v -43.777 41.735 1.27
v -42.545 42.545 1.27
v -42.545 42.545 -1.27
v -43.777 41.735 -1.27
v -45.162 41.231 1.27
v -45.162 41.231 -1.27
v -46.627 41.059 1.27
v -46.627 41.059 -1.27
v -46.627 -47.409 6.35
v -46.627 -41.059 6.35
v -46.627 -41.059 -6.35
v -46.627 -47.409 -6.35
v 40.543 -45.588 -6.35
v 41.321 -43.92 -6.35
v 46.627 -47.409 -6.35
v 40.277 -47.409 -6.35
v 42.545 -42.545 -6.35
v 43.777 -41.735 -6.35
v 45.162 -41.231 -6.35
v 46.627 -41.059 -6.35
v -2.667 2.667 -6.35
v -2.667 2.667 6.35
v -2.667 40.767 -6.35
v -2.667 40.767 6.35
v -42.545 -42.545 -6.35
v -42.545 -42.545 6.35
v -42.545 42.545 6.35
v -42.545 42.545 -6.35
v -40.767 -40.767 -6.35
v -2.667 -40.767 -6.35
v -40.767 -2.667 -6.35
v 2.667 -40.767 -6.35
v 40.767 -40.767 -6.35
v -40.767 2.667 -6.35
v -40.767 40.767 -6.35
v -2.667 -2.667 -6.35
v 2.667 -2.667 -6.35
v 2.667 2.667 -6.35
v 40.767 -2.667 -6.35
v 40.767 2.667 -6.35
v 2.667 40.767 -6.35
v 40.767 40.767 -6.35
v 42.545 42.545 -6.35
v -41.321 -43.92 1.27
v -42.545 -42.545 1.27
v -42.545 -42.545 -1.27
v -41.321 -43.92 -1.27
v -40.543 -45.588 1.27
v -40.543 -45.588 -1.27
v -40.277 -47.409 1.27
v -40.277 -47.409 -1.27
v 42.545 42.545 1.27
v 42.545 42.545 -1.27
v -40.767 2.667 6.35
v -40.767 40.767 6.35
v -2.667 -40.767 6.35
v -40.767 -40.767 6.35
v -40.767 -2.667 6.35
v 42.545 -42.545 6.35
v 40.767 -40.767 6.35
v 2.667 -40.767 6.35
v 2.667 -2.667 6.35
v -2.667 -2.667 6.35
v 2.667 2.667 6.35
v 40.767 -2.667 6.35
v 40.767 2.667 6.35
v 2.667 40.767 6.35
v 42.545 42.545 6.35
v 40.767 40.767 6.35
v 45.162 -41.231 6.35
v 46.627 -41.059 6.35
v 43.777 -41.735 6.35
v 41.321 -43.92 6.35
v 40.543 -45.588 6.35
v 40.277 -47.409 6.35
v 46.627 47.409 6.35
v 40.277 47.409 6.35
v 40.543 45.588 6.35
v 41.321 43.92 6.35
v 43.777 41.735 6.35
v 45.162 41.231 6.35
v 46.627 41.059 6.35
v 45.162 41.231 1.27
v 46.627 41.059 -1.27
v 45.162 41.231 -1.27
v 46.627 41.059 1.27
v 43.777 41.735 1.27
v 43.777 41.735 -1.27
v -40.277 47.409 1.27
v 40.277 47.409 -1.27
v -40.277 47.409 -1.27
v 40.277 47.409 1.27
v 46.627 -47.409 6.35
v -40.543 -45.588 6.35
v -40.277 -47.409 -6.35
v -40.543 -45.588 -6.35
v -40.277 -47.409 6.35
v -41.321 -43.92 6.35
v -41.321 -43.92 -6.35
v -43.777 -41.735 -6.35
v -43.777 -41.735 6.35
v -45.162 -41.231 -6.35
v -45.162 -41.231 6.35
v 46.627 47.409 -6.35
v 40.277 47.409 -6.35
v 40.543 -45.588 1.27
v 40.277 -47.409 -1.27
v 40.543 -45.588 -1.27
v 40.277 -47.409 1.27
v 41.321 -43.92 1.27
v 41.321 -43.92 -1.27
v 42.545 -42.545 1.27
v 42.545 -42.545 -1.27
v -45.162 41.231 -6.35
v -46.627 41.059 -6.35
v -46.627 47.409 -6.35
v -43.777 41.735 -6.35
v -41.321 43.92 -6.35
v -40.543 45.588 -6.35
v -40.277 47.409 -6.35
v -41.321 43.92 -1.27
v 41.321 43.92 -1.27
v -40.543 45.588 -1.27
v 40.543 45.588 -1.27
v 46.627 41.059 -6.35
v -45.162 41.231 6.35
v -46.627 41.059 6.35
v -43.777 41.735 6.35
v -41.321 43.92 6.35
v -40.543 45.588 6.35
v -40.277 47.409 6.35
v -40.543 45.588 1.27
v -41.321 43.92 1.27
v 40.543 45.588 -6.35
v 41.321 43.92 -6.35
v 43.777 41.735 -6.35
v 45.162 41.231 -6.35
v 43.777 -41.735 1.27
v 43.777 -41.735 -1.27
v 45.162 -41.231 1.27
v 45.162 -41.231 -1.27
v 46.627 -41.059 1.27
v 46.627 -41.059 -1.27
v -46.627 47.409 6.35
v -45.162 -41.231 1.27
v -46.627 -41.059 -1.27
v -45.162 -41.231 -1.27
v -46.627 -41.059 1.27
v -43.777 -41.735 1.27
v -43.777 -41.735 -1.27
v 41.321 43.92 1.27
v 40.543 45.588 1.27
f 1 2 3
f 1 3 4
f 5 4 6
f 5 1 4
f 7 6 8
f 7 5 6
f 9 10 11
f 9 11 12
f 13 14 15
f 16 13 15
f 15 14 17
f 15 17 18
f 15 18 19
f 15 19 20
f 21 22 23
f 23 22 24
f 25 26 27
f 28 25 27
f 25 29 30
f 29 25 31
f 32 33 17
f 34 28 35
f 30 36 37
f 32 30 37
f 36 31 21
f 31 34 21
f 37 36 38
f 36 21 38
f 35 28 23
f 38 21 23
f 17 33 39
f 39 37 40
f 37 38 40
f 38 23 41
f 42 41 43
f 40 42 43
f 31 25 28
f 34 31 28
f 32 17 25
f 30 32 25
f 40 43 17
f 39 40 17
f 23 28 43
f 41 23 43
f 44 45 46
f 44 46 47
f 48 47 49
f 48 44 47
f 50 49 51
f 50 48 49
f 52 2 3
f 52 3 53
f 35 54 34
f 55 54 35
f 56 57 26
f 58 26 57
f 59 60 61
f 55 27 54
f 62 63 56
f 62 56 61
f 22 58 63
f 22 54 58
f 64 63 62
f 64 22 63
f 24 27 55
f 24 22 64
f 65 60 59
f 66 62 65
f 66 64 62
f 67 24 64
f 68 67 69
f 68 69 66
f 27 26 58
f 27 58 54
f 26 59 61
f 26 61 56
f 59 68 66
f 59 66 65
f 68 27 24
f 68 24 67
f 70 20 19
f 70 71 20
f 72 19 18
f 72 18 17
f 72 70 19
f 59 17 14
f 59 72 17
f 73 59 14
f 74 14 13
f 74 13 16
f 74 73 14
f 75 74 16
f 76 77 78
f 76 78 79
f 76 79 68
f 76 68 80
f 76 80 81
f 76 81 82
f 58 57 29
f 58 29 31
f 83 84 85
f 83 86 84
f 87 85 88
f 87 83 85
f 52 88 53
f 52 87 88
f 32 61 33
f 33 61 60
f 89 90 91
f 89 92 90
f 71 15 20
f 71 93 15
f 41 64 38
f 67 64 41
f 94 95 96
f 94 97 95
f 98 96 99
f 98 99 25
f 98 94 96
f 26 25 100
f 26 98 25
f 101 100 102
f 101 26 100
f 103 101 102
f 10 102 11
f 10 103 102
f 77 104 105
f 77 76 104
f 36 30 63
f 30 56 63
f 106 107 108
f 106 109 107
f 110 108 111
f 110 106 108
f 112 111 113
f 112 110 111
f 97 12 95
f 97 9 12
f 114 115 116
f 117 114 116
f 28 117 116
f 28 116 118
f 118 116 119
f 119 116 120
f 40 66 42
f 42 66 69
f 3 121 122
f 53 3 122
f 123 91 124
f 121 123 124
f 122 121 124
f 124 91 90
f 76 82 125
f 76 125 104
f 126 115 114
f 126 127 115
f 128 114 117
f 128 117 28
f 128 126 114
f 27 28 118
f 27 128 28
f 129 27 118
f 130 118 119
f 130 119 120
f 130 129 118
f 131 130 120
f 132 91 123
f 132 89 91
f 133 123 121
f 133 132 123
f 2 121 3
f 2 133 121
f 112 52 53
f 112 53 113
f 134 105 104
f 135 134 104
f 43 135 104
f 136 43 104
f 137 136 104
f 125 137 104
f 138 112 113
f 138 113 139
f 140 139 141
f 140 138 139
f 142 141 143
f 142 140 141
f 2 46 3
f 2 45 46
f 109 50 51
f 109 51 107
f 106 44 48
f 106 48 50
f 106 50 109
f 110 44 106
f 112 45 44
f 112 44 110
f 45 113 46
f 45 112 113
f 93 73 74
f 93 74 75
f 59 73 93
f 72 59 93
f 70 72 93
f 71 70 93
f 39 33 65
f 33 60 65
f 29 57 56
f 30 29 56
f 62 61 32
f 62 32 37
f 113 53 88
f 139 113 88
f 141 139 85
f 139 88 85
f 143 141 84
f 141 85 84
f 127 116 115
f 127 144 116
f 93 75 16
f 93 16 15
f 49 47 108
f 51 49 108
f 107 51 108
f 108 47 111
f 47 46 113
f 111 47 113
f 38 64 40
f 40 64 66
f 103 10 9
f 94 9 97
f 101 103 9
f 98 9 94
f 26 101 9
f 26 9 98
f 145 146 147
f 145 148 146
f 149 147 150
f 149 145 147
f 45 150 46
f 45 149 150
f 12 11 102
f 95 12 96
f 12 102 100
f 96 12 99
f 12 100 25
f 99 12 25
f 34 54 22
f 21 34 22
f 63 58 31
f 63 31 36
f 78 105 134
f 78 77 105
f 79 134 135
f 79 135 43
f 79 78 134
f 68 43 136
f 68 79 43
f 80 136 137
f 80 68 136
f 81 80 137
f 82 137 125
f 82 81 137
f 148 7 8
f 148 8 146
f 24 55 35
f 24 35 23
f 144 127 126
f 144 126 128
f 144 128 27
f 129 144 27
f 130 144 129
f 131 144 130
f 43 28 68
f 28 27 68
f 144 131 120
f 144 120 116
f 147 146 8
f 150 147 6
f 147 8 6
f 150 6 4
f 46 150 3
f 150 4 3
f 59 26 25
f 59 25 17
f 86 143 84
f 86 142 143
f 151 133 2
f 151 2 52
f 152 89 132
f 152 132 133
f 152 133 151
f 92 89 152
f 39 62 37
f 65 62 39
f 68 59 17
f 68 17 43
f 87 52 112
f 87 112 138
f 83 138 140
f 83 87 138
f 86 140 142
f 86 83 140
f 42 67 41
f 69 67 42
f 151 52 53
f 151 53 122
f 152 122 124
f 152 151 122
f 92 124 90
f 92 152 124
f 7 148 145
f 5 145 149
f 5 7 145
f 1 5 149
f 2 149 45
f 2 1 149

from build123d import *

# Parameters (mm, degrees)
F1_DEPTH = 6.35
F0_W     = 85.09
F0_H     = 85.09
F0_W_2   = 38.1
F0_H_2   = 38.1
F2_DEPTH = 6.35
F3_DEPTH = 1.27


with BuildPart() as f1:
    # F0 (on Top) → F1 (new body, symmetric)
    with BuildSketch(Plane.XY):
        with BuildLine():
            ThreePointArc((40.2767013215, 47.4093822138), (40.8716468738, 44.7257562518), (42.545, 42.545))
            ThreePointArc((42.545, 42.545), (44.4548734114, 41.4423340718), (46.6267013215, 41.0593822138))
            Line((46.6267013215, 41.0593822138), (46.6267013215, 47.4093822138))
            Line((46.6267013215, 47.4093822138), (40.2767013215, 47.4093822138))
        make_face()
    extrude(amount=F1_DEPTH, both=True)


with BuildPart() as f1b:
    # F0 (on Top) → F1, piece 2 (new body, symmetric)
    with BuildSketch(Plane.XY):
        with BuildLine():
            ThreePointArc((46.6267013215, -41.0593822138), (44.4548734114, -41.4423340718), (42.545, -42.545))
            ThreePointArc((42.545, -42.545), (40.8716468738, -44.7257562518), (40.2767013215, -47.4093822138))
            Line((40.2767013215, -47.4093822138), (46.6267013215, -47.4093822138))
            Line((46.6267013215, -47.4093822138), (46.6267013215, -41.0593822138))
        make_face()
    extrude(amount=F1_DEPTH, both=True)


with BuildPart() as f1c:
    # F0 (on Top) → F1, piece 3 (new body, symmetric)
    with BuildSketch(Plane.XY):
        with BuildLine():
            ThreePointArc((-46.6267013215, 41.0593822138), (-44.4548734114, 41.4423340718), (-42.545, 42.545))
            ThreePointArc((-42.545, 42.545), (-40.8716468738, 44.7257562518), (-40.2767013215, 47.4093822138))
            Line((-40.2767013215, 47.4093822138), (-46.6267013215, 47.4093822138))
            Line((-46.6267013215, 47.4093822138), (-46.6267013215, 41.0593822138))
        make_face()
    extrude(amount=F1_DEPTH, both=True)


with BuildPart() as f1d:
    # F0 (on Top) → F1, piece 4 (new body, symmetric)
    with BuildSketch(Plane.XY):
        with BuildLine():
            ThreePointArc((-40.2767013215, -47.4093822138), (-40.8716468738, -44.7257562518), (-42.545, -42.545))
            ThreePointArc((-42.545, -42.545), (-44.4548734114, -41.4423340718), (-46.6267013215, -41.0593822138))
            Line((-46.6267013215, -41.0593822138), (-46.6267013215, -47.4093822138))
            Line((-46.6267013215, -47.4093822138), (-40.2767013215, -47.4093822138))
        make_face()
    extrude(amount=F1_DEPTH, both=True)


with BuildPart() as f2:
    # F0 (on Top) → F2 (new body, symmetric)
    with BuildSketch(Plane.XY):
        Rectangle(F0_W, F0_H)
        with Locations((-21.717, -21.717)):
            Rectangle(F0_W_2, F0_H_2, mode=Mode.SUBTRACT)
        with Locations((21.717, -21.717)):
            Rectangle(F0_W_2, F0_H_2, mode=Mode.SUBTRACT)
        with Locations((-21.717, 21.717)):
            Rectangle(F0_W_2, F0_H_2, mode=Mode.SUBTRACT)
        with Locations((21.717, 21.717)):
            Rectangle(F0_W_2, F0_H_2, mode=Mode.SUBTRACT)
    extrude(amount=F2_DEPTH, both=True)


with BuildPart() as f3:
    # F0 (on Top) → F3 (new body, symmetric)
    with BuildSketch(Plane.XY):
        with BuildLine():
            Line((-42.545, -42.545), (-42.545, 42.545))
            ThreePointArc((-42.545, 42.545), (-44.4548734114, 41.4423340718), (-46.6267013215, 41.0593822138))
            Line((-46.6267013215, 41.0593822138), (-46.6267013215, -41.0593822138))
            ThreePointArc((-46.6267013215, -41.0593822138), (-44.4548734114, -41.4423340718), (-42.545, -42.545))
        make_face()
    extrude(amount=F3_DEPTH, both=True)


with BuildPart() as f3b:
    # F0 (on Top) → F3, piece 2 (new body, symmetric)
    with BuildSketch(Plane.XY):
        with BuildLine():
            ThreePointArc((-40.2767013215, 47.4093822138), (-40.8716468738, 44.7257562518), (-42.545, 42.545))
            Line((-42.545, 42.545), (42.545, 42.545))
            ThreePointArc((42.545, 42.545), (40.8716468738, 44.7257562518), (40.2767013215, 47.4093822138))
            Line((40.2767013215, 47.4093822138), (-40.2767013215, 47.4093822138))
        make_face()
    extrude(amount=F3_DEPTH, both=True)


with BuildPart() as f3c:
    # F0 (on Top) → F3, piece 3 (new body, symmetric)
    with BuildSketch(Plane.XY):
        with BuildLine():
            ThreePointArc((46.6267013215, 41.0593822138), (44.4548734114, 41.4423340718), (42.545, 42.545))
            Line((42.545, 42.545), (42.545, -42.545))
            ThreePointArc((42.545, -42.545), (44.4548734114, -41.4423340718), (46.6267013215, -41.0593822138))
            Line((46.6267013215, -41.0593822138), (46.6267013215, 41.0593822138))
        make_face()
    extrude(amount=F3_DEPTH, both=True)


with BuildPart() as f3d:
    # F0 (on Top) → F3, piece 4 (new body, symmetric)
    with BuildSketch(Plane.XY):
        with BuildLine():
            Line((42.545, -42.545), (-42.545, -42.545))
            ThreePointArc((-42.545, -42.545), (-40.8716468738, -44.7257562518), (-40.2767013215, -47.4093822138))
            Line((-40.2767013215, -47.4093822138), (40.2767013215, -47.4093822138))
            ThreePointArc((40.2767013215, -47.4093822138), (40.8716468738, -44.7257562518), (42.545, -42.545))
        make_face()
    extrude(amount=F3_DEPTH, both=True)


solid = Compound([f1.part, f1b.part, f1c.part, f1d.part, f2.part, f3.part, f3b.part, f3c.part, f3d.part])
